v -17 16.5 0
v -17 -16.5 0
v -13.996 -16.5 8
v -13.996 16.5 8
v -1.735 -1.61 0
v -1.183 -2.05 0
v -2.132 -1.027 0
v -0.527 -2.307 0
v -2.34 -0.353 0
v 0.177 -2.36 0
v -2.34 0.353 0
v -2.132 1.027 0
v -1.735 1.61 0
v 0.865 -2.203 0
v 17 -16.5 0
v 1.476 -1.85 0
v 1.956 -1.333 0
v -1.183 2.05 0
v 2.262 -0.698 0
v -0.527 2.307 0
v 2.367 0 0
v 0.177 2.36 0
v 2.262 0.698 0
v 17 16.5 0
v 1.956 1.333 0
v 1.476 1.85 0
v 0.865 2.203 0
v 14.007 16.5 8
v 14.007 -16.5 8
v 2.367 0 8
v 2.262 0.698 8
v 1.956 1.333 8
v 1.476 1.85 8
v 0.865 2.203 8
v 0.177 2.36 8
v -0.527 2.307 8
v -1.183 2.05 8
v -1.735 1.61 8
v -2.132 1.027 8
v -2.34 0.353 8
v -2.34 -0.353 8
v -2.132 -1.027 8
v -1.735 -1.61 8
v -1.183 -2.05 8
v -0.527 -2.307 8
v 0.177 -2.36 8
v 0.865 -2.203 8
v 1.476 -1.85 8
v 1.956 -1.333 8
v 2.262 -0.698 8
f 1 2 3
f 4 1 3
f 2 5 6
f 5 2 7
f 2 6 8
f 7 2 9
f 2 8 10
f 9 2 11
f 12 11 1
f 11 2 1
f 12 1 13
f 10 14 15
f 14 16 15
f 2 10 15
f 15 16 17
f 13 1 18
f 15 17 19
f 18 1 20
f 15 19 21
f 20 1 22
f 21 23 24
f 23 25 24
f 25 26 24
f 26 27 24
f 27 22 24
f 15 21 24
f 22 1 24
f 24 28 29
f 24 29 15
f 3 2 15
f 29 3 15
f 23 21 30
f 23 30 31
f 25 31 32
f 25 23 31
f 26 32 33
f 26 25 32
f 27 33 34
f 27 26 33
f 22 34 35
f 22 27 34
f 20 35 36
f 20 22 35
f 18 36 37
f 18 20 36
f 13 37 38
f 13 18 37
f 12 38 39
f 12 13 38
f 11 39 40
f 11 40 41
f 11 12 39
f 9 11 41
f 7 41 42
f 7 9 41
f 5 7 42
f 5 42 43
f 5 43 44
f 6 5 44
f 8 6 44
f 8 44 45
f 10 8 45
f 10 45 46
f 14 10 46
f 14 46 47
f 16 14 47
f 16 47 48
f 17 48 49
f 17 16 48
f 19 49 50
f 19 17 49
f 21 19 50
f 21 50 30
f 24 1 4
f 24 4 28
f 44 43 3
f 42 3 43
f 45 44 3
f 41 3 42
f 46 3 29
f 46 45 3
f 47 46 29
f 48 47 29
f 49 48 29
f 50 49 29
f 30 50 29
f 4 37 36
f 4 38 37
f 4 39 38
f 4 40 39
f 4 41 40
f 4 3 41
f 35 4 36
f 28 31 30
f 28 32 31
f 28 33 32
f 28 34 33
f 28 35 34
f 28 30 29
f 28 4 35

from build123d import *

# Parameters (mm, degrees)
F0_W     = 34
F0_H     = 33
F0_R     = 2.366828
F1_DEPTH = 8
F3_DEPTH = 35


with BuildPart() as f1:
    # F0 (on Top) → F1 (new body)
    with BuildSketch(Plane.XY):
        Rectangle(F0_W, F0_H)
        Circle(F0_R, mode=Mode.SUBTRACT)
    extrude(amount=F1_DEPTH)

    # F2 (on face) → F3 (cut)
    with BuildSketch(Plane.XZ.offset(16.5)):
        Polygon((-17, 0), (-13.995684, 8), (-17, 8), align=None)
        Polygon((17, 8), (14.007485, 8), (17, 0), align=None)
    extrude(amount=-F3_DEPTH, mode=Mode.SUBTRACT)


solid = f1.part
